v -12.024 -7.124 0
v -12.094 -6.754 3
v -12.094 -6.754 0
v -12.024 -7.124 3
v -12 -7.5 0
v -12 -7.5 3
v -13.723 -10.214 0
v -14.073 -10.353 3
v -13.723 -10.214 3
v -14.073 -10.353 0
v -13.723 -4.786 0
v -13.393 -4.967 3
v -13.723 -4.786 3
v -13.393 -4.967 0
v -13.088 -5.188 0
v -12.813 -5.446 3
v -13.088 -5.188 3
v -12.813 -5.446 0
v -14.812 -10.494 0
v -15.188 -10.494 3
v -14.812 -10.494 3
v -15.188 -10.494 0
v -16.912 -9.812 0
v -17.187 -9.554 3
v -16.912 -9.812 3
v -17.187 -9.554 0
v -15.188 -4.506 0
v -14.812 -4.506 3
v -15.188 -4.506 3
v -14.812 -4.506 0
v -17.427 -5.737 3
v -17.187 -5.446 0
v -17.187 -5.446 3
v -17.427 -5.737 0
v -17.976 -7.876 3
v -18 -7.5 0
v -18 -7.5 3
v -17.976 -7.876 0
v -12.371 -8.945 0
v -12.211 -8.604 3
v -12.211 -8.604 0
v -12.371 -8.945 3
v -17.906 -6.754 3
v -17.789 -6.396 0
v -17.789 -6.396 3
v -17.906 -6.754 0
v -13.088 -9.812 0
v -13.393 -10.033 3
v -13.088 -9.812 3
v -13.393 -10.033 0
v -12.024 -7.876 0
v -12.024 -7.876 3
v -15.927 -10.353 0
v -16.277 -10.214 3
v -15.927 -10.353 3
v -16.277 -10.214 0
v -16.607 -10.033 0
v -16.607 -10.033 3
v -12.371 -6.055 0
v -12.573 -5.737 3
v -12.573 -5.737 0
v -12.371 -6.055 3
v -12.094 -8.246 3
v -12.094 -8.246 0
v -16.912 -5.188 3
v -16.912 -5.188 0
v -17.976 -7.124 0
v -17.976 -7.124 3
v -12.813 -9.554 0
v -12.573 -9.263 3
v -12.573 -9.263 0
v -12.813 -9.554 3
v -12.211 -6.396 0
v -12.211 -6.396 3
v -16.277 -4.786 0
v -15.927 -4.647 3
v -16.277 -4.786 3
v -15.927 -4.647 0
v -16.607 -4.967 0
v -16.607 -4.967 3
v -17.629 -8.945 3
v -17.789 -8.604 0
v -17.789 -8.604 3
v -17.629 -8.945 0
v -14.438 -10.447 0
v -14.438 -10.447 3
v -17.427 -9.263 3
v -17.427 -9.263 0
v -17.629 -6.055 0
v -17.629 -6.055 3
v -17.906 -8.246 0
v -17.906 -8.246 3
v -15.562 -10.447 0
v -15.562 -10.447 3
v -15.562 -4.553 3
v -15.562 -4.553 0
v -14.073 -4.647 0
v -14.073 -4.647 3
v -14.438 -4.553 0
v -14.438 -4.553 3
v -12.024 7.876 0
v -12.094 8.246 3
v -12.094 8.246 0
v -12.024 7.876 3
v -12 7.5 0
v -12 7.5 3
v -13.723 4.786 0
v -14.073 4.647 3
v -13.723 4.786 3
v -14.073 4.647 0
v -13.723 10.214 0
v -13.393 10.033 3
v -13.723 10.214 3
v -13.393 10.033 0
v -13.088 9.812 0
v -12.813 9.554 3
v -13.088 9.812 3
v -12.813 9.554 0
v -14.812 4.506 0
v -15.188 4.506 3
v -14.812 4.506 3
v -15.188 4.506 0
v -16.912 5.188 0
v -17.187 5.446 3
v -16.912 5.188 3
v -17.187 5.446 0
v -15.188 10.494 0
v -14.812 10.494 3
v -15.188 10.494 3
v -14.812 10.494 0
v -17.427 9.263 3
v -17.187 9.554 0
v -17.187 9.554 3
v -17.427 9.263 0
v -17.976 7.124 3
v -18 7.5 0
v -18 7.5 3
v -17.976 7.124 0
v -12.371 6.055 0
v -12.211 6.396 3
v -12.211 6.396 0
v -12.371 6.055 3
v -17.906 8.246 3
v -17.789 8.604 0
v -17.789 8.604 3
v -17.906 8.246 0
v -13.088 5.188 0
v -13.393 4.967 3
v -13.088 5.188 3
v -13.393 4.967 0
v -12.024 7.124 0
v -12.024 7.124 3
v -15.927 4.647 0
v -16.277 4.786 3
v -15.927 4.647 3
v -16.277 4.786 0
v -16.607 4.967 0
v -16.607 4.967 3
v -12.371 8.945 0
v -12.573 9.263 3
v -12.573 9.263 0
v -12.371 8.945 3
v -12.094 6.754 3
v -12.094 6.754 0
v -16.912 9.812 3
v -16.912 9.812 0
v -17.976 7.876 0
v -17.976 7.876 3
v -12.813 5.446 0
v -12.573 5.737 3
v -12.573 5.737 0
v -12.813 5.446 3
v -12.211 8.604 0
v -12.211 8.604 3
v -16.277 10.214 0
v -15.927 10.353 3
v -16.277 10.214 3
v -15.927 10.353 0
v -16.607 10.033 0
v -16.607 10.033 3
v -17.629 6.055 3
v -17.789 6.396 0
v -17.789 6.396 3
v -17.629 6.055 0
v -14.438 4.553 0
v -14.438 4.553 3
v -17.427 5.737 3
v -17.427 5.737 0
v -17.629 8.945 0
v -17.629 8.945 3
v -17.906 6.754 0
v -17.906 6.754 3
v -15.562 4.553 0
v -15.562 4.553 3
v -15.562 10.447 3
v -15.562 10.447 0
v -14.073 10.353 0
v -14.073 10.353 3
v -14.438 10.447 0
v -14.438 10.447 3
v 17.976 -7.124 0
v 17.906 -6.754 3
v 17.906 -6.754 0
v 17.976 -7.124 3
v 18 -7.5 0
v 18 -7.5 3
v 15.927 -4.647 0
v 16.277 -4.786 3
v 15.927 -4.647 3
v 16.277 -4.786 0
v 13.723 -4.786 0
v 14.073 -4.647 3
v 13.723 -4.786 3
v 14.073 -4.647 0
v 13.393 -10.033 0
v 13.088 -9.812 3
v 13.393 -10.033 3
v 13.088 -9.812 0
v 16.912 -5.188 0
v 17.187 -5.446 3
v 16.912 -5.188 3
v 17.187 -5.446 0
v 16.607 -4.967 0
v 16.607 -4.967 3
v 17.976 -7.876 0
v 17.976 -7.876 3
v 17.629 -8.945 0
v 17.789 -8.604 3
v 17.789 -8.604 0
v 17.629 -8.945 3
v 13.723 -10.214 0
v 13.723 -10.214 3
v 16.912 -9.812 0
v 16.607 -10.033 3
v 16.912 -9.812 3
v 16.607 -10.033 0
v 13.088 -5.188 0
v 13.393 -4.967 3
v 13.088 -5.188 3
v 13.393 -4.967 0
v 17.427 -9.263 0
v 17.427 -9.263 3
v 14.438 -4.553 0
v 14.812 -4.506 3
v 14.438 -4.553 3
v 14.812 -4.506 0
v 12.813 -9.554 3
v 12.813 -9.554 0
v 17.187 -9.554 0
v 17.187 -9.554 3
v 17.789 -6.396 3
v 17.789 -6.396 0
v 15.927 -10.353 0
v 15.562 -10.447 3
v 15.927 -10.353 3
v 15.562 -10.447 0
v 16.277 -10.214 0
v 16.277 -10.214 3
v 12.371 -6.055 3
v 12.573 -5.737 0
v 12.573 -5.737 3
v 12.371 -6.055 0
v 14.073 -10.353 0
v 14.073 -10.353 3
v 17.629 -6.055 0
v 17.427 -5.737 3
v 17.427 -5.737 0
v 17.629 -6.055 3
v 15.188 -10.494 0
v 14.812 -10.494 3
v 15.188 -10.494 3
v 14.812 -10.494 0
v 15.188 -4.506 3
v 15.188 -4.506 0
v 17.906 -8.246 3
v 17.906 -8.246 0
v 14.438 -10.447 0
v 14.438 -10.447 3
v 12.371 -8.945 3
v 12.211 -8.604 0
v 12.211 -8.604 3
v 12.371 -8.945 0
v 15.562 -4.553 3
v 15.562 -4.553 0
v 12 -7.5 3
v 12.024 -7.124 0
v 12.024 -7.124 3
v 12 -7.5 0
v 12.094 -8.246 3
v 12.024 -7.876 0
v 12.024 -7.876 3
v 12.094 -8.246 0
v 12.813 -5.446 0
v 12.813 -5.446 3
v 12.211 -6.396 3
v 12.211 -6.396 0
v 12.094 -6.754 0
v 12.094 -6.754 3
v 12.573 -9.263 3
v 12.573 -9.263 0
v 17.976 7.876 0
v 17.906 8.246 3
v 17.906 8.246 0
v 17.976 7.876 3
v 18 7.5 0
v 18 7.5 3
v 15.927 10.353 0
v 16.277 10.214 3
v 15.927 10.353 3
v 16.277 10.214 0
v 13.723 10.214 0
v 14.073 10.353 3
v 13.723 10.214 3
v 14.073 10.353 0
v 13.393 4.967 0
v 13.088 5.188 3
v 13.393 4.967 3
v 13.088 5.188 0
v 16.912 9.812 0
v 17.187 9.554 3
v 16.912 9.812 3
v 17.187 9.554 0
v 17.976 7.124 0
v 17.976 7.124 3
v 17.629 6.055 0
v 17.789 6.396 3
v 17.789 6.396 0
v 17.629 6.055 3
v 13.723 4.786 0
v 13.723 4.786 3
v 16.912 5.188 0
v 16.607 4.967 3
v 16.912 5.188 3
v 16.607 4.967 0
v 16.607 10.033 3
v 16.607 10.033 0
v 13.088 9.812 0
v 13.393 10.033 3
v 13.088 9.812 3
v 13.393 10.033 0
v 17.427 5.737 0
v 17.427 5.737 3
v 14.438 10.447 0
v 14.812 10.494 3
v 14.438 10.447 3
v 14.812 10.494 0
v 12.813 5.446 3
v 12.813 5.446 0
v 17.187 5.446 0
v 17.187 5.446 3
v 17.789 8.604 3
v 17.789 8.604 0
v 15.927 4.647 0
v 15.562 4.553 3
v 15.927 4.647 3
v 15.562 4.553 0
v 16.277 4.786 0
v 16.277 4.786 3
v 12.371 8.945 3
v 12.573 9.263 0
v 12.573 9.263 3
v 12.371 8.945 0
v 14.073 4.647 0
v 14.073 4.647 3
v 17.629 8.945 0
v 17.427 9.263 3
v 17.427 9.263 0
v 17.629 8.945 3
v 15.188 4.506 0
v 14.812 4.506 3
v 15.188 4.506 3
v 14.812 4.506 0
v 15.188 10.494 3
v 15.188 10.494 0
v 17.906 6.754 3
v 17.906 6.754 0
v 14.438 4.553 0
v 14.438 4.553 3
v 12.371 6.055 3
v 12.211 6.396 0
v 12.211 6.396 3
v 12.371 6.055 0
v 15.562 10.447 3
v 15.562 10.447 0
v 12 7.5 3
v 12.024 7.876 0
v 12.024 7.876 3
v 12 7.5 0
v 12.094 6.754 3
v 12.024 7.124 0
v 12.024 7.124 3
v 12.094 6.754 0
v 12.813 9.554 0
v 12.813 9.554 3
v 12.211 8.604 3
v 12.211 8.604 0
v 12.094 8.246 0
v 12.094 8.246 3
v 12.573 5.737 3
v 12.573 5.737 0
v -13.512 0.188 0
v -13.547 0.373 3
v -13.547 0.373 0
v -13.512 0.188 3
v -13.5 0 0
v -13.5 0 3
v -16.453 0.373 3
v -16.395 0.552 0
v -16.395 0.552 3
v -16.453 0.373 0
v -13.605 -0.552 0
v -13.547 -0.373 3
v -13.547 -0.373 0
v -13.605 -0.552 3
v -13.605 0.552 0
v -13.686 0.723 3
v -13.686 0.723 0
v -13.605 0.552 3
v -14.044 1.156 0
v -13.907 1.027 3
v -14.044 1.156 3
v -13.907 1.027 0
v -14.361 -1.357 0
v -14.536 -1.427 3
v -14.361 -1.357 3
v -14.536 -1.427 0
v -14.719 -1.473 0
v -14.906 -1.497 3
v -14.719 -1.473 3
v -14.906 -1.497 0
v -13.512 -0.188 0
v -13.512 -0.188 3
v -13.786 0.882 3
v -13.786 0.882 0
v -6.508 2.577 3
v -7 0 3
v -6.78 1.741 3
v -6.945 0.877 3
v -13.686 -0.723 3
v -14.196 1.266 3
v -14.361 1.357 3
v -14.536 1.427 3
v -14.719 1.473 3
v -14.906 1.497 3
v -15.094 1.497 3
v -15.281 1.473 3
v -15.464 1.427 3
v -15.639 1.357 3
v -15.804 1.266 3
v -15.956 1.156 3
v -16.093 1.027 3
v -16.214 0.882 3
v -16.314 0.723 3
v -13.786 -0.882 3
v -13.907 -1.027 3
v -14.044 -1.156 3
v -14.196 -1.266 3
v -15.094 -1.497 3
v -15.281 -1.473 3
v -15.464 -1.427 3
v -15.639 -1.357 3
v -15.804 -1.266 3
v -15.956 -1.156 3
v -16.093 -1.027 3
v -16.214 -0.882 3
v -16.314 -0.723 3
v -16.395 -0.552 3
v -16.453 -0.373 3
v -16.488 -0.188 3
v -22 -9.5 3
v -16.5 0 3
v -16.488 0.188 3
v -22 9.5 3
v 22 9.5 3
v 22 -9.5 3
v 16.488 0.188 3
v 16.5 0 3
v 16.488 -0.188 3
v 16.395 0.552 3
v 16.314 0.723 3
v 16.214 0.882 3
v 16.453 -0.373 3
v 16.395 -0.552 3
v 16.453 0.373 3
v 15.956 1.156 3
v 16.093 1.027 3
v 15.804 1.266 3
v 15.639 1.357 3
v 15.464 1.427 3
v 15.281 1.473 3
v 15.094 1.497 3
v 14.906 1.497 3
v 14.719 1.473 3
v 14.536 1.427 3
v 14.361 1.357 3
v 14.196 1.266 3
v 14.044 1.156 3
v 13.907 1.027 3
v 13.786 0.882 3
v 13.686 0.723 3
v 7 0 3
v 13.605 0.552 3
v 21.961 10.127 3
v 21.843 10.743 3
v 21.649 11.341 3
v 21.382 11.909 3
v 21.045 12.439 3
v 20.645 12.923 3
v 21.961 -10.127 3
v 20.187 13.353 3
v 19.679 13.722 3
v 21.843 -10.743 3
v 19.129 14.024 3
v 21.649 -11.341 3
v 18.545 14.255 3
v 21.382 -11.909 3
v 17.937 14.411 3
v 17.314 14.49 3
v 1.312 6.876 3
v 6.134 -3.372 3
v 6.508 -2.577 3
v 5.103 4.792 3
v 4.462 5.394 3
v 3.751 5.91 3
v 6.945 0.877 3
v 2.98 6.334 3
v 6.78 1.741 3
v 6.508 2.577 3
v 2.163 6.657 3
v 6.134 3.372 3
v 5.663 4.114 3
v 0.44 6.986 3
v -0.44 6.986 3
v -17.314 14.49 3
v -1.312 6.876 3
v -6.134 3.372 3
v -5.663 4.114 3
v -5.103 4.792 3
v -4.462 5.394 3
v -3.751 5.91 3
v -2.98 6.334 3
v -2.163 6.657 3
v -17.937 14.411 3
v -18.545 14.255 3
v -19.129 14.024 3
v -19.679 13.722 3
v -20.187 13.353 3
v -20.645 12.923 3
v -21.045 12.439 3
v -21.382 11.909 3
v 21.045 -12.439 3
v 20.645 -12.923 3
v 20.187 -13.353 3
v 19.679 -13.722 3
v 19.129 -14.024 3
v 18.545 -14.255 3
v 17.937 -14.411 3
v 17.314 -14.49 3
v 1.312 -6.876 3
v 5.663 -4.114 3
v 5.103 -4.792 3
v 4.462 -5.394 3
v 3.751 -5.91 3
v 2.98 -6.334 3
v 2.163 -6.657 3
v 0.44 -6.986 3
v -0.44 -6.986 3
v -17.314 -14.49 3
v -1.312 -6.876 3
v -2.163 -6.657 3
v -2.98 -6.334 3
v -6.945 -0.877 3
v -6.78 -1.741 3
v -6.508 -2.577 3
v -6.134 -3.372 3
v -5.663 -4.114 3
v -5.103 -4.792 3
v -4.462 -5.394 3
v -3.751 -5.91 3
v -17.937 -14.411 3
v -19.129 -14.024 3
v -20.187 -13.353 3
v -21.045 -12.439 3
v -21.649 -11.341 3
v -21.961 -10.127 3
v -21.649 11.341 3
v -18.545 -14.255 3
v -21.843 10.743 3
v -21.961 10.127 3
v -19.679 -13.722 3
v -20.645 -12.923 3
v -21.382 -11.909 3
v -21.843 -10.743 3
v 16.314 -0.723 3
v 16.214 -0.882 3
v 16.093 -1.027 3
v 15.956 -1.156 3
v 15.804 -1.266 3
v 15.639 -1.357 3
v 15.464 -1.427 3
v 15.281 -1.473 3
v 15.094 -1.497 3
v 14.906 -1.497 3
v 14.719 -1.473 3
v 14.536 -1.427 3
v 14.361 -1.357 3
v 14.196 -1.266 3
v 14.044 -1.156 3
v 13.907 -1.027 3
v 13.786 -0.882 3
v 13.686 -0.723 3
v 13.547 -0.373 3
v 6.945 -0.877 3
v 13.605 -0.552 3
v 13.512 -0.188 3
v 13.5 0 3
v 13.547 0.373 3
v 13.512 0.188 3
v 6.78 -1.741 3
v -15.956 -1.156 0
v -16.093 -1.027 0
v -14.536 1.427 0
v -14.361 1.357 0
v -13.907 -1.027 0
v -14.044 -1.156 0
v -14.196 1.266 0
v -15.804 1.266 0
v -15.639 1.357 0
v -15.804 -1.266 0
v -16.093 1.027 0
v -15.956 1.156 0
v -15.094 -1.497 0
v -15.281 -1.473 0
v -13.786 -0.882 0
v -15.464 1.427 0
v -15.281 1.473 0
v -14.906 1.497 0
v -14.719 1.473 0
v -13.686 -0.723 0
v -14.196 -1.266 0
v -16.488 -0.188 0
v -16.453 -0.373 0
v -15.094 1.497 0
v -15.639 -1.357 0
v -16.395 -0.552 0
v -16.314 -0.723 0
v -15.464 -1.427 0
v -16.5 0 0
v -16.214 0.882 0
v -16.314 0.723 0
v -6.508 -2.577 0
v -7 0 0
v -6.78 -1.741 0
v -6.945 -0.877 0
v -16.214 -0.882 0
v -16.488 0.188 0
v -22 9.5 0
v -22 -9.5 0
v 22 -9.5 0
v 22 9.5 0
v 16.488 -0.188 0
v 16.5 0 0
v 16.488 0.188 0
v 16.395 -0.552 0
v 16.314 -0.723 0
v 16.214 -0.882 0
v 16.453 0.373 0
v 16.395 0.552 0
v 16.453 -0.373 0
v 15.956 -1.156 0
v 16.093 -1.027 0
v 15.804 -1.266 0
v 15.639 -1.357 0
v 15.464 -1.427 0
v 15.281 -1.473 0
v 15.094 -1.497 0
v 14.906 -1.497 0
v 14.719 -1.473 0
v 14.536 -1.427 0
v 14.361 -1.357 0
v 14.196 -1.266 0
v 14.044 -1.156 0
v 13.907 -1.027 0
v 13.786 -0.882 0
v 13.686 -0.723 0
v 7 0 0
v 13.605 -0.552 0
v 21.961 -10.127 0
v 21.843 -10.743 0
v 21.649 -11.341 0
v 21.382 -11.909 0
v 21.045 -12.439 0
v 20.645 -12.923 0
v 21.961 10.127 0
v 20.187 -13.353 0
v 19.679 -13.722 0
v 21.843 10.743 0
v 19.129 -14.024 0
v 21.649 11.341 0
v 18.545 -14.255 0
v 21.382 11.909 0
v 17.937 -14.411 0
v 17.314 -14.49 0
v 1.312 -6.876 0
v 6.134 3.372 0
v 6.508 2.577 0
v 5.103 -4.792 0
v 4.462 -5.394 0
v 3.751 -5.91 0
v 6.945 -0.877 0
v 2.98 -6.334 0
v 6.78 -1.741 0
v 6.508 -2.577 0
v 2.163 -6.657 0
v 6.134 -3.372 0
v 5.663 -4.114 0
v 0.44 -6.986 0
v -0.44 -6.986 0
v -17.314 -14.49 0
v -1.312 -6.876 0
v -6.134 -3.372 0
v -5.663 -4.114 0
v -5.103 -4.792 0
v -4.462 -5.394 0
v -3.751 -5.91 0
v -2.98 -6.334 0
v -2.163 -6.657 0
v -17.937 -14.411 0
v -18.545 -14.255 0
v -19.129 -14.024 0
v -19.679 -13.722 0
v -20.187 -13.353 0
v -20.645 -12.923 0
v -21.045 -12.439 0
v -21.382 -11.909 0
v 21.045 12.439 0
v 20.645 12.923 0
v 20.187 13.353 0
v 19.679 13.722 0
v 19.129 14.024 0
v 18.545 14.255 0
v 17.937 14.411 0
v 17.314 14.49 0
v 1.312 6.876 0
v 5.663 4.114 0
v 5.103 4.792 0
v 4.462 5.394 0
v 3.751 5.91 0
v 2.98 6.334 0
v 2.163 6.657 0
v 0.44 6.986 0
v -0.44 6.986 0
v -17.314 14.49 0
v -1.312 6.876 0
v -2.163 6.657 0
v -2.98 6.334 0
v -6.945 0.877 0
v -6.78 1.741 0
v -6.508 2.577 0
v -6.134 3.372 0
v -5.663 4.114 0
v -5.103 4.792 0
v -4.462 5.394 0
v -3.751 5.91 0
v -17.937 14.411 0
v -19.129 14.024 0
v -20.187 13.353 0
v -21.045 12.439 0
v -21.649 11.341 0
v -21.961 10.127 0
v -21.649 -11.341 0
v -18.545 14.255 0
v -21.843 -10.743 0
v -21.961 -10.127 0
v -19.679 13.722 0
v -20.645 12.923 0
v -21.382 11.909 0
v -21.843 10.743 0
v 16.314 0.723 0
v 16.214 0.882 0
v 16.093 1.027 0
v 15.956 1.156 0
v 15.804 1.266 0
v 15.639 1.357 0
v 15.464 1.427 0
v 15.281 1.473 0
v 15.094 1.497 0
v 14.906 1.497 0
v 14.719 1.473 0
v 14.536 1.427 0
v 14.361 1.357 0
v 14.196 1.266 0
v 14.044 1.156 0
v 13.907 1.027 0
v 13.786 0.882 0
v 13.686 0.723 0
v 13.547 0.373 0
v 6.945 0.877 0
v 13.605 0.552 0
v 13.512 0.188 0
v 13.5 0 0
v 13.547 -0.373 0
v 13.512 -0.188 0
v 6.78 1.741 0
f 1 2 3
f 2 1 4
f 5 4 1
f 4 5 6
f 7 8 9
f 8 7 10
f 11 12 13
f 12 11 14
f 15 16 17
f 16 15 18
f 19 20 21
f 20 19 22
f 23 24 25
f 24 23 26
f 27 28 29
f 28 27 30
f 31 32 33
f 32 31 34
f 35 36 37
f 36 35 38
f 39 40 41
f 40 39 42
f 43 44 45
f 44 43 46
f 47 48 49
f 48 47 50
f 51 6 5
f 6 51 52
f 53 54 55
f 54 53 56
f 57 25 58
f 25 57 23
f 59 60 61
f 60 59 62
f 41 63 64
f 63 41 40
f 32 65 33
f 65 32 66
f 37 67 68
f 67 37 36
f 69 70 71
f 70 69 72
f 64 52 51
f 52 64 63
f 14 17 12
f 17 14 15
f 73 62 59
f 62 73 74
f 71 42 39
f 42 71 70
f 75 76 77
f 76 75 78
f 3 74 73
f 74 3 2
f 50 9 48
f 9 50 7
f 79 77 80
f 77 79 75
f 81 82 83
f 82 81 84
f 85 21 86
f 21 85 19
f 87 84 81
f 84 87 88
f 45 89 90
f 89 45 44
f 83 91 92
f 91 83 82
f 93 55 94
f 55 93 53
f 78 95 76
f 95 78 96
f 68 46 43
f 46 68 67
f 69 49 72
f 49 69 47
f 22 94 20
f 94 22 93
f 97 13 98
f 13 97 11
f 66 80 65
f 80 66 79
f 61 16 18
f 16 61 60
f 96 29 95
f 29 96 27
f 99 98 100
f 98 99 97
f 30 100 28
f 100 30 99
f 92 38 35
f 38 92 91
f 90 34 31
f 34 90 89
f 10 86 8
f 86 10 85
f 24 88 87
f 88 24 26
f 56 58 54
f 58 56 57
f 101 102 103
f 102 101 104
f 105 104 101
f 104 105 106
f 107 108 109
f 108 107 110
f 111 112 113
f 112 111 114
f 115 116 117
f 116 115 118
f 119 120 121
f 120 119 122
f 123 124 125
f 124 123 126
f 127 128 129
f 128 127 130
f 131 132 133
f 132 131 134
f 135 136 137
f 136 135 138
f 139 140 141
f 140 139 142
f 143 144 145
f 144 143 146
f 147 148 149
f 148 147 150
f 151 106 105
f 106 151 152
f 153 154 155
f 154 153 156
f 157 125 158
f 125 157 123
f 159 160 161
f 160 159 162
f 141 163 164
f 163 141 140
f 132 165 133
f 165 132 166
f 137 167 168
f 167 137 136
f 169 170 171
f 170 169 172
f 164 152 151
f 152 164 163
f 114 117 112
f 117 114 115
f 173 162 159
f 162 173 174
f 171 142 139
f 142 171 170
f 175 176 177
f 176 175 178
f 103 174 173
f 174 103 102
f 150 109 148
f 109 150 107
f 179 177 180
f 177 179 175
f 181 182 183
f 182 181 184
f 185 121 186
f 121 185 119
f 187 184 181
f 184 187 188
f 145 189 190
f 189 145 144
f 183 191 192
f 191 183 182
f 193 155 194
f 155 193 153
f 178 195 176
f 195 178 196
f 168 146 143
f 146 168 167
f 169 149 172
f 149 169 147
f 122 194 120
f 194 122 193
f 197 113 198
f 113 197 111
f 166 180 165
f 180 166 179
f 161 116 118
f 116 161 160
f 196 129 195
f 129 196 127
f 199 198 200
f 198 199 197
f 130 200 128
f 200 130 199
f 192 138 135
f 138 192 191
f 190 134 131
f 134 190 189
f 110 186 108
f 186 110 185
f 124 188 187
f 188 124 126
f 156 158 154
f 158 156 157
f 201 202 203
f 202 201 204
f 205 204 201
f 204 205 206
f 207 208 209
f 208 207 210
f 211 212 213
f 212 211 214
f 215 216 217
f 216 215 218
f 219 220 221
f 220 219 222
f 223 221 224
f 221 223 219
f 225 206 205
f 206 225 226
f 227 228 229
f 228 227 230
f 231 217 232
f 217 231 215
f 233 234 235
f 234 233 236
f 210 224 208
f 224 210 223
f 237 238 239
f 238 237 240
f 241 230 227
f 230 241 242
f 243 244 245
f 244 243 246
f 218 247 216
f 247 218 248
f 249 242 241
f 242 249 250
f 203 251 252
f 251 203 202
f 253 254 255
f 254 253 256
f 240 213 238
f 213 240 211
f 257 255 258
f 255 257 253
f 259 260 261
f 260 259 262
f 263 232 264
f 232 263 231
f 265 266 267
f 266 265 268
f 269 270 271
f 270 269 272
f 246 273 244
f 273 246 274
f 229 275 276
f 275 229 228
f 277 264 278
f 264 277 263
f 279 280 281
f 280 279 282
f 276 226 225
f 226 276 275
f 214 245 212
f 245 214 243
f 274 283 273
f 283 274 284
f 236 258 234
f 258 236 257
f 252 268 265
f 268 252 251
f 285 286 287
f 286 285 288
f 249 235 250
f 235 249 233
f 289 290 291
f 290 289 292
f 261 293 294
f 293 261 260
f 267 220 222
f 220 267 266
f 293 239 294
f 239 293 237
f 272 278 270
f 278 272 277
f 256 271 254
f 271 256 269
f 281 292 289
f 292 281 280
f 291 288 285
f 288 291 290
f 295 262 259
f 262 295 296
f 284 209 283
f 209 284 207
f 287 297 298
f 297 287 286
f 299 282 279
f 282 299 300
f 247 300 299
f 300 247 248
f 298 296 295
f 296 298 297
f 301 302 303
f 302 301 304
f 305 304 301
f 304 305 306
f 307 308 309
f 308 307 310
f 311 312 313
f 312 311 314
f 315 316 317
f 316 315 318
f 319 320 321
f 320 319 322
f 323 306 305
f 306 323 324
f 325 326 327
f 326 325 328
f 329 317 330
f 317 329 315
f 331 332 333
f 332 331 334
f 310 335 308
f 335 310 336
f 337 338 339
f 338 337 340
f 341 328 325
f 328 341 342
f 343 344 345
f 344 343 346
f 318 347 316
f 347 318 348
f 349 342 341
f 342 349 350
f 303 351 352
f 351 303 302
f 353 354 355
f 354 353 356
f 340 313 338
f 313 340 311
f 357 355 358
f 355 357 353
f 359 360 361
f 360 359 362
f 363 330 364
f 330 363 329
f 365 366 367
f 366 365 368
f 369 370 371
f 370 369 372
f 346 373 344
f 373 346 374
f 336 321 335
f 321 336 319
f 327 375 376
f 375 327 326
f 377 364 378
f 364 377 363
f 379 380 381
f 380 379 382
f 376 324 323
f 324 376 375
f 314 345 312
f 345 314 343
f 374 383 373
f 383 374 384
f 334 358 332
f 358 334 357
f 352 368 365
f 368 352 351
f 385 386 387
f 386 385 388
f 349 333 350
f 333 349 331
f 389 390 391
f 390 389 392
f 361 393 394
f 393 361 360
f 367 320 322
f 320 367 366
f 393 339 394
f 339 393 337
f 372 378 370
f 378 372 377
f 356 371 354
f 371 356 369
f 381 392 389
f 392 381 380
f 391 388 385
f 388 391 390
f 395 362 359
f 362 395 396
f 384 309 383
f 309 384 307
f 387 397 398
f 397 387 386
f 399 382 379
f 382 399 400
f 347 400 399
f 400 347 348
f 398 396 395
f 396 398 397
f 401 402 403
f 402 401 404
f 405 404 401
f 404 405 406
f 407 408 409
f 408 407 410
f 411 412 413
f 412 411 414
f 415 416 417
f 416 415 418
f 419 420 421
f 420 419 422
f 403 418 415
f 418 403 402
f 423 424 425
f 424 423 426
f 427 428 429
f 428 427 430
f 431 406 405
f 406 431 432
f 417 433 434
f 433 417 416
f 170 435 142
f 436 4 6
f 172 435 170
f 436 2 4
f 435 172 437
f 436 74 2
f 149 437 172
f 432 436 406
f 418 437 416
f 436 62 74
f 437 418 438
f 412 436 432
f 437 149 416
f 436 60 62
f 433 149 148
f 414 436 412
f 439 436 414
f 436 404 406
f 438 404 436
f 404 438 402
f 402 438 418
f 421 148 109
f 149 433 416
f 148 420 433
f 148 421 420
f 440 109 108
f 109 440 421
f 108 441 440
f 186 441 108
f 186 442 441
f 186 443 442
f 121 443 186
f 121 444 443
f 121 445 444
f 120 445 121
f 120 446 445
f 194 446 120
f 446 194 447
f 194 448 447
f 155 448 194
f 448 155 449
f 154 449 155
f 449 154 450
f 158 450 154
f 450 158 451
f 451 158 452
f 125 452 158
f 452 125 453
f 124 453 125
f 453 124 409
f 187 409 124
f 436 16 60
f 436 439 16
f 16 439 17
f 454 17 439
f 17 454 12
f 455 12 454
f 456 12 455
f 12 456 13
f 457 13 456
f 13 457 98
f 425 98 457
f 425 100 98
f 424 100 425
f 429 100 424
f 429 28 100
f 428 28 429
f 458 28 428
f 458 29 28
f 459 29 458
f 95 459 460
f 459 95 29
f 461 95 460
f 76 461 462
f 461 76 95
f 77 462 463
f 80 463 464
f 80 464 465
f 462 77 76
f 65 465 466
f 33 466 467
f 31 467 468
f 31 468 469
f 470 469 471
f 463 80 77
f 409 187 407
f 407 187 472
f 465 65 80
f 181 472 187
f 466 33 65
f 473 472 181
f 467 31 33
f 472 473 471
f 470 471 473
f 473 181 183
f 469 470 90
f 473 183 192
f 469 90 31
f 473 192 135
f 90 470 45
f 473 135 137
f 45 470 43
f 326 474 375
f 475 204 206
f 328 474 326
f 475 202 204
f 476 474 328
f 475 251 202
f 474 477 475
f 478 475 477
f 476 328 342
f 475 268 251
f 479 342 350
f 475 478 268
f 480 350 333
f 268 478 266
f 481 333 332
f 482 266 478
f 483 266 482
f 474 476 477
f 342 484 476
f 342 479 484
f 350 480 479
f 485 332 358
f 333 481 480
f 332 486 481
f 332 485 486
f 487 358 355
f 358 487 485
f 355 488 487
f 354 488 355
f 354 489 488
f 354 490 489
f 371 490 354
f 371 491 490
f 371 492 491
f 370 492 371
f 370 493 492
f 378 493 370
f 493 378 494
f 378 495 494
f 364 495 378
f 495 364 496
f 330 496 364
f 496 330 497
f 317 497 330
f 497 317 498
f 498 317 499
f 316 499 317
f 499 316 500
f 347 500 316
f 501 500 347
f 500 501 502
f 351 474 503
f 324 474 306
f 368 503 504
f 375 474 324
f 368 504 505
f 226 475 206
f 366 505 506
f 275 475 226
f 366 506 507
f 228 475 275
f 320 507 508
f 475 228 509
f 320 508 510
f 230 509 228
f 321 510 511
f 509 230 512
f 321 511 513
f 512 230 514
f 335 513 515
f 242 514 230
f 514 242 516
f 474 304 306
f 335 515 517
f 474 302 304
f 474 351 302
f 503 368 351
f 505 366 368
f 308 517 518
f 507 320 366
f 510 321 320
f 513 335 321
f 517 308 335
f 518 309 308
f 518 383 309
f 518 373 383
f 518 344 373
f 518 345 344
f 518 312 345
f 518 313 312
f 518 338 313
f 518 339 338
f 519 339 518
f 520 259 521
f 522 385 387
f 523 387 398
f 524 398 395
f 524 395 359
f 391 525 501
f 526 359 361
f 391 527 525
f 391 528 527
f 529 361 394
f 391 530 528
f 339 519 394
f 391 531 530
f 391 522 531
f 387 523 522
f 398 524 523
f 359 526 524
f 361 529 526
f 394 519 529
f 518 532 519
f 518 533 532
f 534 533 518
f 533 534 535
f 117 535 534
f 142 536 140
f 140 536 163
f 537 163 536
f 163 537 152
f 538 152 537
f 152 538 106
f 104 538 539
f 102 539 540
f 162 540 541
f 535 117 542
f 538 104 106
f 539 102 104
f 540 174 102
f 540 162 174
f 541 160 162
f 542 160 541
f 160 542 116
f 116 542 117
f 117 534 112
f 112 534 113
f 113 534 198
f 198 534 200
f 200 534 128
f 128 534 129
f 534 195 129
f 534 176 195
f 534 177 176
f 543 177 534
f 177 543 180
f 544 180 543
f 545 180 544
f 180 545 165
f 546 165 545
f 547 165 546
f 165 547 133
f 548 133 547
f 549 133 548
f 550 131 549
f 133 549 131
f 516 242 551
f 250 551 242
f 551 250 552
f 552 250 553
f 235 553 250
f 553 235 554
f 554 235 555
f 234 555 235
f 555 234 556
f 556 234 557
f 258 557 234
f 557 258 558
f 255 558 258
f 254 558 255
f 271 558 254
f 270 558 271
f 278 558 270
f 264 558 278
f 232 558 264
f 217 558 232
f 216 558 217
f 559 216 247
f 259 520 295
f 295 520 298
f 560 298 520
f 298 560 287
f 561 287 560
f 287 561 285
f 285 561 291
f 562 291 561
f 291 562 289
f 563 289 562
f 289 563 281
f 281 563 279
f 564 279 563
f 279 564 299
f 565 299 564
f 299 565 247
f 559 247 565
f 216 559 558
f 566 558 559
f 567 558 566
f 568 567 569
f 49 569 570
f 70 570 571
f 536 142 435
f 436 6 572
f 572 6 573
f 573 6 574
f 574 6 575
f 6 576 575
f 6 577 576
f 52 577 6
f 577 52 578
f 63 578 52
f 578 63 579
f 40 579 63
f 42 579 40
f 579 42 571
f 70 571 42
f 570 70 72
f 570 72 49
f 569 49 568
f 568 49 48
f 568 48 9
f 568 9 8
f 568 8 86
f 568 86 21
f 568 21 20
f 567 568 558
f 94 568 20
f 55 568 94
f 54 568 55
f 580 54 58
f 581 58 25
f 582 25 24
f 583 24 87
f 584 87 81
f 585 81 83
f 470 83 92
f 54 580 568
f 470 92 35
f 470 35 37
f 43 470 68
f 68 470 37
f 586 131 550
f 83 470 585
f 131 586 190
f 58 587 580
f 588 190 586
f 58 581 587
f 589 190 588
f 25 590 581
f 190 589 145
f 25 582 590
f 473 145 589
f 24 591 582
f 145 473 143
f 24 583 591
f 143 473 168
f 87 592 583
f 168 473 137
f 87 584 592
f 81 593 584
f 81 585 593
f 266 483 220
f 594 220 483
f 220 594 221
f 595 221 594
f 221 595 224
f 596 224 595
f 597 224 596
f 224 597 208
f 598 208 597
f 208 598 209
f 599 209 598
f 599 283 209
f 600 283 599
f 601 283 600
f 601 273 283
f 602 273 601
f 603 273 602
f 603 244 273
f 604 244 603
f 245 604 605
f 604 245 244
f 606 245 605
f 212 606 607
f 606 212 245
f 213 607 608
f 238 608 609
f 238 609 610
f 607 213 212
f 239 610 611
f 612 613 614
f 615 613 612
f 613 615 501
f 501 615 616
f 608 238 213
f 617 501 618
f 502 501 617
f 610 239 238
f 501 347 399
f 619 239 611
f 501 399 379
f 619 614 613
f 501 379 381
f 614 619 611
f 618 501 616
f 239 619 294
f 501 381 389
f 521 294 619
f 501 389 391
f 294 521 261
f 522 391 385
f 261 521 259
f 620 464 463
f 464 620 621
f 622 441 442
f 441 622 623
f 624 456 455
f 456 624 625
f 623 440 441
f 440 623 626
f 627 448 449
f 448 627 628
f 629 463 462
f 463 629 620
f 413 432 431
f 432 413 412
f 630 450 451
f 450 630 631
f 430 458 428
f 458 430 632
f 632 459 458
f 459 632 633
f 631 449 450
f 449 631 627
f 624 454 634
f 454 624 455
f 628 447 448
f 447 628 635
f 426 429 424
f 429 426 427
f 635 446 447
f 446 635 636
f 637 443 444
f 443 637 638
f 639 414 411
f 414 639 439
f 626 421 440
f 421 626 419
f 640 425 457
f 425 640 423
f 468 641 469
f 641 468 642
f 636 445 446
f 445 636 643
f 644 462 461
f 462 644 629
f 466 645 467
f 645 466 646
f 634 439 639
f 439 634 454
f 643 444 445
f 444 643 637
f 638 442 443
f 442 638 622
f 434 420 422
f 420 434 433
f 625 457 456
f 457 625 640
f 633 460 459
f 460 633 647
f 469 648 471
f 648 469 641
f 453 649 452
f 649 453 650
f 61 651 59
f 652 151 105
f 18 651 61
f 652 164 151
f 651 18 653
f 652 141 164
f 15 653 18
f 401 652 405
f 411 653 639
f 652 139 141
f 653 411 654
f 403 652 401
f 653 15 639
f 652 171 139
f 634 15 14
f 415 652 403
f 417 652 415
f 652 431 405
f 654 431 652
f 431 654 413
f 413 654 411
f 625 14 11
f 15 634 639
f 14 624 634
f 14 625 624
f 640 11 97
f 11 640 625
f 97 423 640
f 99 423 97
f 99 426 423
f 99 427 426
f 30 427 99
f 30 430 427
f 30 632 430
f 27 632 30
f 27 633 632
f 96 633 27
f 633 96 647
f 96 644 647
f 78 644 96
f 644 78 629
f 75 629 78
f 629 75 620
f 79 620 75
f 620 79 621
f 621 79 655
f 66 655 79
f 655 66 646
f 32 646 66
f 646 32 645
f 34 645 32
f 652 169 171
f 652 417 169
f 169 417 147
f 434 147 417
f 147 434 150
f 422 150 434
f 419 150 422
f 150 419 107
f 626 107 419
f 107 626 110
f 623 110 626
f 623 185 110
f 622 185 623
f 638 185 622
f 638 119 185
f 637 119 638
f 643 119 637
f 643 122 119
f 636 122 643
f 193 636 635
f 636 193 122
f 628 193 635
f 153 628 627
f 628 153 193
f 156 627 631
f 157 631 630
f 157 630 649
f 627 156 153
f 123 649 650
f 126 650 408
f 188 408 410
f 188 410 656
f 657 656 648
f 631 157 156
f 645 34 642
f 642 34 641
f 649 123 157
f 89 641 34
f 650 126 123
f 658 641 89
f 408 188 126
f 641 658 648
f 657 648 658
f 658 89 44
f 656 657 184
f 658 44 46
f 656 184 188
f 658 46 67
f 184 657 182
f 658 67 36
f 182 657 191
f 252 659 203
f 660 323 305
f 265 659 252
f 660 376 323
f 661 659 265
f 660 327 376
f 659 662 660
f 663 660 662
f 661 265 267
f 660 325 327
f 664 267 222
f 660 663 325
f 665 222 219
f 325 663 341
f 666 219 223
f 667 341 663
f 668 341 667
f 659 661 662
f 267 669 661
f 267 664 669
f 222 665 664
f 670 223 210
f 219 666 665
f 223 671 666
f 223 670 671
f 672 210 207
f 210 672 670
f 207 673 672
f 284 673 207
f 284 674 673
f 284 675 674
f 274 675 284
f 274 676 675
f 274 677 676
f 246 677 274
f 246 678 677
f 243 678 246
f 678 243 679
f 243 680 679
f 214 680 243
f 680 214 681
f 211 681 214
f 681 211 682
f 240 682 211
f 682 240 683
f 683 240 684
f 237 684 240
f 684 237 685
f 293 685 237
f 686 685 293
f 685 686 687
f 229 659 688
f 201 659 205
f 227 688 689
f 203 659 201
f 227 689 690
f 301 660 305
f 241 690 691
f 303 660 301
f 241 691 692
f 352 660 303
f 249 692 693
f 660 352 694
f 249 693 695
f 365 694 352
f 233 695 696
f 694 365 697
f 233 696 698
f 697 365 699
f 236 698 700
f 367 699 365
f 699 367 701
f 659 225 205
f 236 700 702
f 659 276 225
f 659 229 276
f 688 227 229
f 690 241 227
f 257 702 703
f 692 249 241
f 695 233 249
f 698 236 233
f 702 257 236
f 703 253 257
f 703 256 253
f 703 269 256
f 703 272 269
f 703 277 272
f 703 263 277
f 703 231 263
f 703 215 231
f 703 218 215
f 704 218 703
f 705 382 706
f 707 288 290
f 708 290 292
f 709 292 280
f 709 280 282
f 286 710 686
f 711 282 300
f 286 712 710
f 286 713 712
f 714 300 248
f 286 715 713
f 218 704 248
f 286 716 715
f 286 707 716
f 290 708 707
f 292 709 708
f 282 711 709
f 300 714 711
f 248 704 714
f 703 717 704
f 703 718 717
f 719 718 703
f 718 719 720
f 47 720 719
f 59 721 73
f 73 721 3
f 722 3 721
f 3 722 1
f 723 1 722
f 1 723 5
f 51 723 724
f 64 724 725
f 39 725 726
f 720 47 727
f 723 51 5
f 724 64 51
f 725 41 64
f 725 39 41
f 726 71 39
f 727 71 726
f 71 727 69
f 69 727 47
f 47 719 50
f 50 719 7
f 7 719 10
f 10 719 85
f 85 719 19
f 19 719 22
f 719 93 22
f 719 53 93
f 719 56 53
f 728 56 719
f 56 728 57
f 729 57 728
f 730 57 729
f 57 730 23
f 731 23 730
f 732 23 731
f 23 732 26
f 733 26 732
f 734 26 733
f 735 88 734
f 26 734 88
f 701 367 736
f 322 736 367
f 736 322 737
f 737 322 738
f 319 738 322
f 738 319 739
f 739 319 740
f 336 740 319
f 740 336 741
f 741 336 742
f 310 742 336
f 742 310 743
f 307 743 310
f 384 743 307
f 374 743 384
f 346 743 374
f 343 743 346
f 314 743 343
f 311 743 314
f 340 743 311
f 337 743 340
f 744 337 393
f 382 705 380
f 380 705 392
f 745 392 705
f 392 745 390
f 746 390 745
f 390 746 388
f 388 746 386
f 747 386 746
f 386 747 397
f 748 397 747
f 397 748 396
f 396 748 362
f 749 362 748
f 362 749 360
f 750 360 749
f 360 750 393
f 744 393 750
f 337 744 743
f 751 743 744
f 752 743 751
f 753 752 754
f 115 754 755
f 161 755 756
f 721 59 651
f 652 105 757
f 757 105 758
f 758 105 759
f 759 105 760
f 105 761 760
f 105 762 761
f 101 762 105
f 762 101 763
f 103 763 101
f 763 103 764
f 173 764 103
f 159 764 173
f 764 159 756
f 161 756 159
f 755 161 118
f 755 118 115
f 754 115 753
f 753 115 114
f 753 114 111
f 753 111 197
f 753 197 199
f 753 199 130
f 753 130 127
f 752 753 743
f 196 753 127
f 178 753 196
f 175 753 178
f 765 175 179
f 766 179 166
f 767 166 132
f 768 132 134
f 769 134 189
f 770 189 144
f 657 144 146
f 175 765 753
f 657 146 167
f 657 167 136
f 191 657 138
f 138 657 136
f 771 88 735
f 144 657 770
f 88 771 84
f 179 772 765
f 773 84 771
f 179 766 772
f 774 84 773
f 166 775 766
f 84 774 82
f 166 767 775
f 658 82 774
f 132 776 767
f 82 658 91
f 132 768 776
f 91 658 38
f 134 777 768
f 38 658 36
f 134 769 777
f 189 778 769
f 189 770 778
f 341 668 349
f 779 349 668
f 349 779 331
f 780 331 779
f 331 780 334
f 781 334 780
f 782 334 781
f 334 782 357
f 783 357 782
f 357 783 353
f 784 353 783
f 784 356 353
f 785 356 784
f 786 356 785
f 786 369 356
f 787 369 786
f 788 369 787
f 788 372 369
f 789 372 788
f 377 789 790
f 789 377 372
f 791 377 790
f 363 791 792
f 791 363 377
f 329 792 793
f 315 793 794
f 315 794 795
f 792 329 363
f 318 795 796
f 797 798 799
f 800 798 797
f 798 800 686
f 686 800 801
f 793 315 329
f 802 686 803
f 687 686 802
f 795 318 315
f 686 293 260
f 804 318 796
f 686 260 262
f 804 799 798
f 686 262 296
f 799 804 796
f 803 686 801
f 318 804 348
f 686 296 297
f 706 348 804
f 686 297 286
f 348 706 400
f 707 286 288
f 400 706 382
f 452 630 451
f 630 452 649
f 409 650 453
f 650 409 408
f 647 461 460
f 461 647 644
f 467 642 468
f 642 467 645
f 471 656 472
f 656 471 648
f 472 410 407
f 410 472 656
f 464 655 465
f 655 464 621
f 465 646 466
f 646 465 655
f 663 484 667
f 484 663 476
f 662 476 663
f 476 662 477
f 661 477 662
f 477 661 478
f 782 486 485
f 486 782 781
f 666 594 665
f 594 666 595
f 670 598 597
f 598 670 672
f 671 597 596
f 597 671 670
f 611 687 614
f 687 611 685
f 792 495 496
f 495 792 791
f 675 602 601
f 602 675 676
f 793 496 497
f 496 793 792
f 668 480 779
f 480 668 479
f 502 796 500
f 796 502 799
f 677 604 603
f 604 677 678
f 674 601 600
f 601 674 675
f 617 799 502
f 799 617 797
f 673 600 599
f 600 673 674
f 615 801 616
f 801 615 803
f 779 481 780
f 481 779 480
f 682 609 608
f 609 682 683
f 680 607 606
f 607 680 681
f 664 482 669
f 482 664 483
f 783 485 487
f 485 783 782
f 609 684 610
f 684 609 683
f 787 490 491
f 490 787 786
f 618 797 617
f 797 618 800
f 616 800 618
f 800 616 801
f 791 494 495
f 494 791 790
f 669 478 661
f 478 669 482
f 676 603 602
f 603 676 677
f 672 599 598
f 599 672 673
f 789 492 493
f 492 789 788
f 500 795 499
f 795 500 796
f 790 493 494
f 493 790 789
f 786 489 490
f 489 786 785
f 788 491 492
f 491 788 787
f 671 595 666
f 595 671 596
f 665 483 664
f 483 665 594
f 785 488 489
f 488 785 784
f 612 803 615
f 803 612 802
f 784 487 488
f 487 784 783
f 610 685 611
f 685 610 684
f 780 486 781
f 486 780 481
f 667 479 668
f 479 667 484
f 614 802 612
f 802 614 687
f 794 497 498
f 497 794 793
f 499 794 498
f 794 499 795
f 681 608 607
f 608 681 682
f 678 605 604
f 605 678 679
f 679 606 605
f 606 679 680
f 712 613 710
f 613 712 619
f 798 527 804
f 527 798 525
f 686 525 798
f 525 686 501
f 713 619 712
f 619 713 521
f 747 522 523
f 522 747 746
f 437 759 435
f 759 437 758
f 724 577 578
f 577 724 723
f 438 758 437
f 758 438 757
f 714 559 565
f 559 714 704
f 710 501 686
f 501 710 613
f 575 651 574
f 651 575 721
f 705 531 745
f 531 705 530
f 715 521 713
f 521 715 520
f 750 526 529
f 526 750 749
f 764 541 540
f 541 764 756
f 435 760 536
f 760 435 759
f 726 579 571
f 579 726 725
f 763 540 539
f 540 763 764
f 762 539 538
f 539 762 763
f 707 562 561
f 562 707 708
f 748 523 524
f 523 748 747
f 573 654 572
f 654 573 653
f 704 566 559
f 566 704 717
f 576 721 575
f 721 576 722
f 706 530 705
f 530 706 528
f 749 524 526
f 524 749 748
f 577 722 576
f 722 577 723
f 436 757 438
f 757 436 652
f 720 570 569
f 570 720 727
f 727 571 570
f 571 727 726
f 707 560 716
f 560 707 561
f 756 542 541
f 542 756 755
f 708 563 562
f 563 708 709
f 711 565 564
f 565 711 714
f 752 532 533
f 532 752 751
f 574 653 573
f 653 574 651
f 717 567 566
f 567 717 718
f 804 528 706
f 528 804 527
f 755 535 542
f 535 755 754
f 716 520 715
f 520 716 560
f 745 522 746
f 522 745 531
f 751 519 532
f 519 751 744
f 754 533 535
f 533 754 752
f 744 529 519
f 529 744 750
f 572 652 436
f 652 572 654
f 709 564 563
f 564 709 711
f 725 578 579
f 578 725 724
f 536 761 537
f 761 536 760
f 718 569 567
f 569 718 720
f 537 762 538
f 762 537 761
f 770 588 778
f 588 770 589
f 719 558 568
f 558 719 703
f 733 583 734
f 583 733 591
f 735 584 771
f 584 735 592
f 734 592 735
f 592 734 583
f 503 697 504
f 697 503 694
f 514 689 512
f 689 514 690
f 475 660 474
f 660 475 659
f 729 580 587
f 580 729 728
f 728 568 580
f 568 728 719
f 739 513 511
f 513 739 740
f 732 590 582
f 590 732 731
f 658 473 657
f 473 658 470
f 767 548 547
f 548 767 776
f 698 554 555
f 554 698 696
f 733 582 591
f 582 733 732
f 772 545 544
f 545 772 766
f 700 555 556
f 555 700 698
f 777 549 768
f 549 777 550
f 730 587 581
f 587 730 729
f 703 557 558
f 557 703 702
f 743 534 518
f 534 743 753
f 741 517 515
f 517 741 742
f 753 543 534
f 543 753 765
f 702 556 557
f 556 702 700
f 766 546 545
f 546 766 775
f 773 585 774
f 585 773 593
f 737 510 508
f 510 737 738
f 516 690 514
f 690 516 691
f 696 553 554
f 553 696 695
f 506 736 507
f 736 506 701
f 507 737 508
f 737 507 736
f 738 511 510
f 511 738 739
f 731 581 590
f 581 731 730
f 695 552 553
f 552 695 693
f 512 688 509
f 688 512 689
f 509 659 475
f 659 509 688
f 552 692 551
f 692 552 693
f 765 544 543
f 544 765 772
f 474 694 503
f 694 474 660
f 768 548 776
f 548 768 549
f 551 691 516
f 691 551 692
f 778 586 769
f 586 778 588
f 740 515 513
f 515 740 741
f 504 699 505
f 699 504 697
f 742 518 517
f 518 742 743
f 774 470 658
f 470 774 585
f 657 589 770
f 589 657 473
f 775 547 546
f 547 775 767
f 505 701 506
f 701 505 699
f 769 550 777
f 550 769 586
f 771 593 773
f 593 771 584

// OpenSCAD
$fn = 50;


difference() {
	union() {
		hull() {
			translate(v = [-17.0000000000, 9.5000000000, 0]) {
				cylinder(h = 3, r = 5);
			}
			translate(v = [17.0000000000, 9.5000000000, 0]) {
				cylinder(h = 3, r = 5);
			}
			translate(v = [-17.0000000000, -9.5000000000, 0]) {
				cylinder(h = 3, r = 5);
			}
			translate(v = [17.0000000000, -9.5000000000, 0]) {
				cylinder(h = 3, r = 5);
			}
		}
	}
	union() {
		#translate(v = [-15.0000000000, -7.5000000000, 0]) {
			cylinder(h = 3, r = 3.0000000000);
		}
		#translate(v = [-15.0000000000, 7.5000000000, 0]) {
			cylinder(h = 3, r = 3.0000000000);
		}
		#translate(v = [15.0000000000, -7.5000000000, 0]) {
			cylinder(h = 3, r = 3.0000000000);
		}
		#translate(v = [15.0000000000, 7.5000000000, 0]) {
			cylinder(h = 3, r = 3.0000000000);
		}
		#translate(v = [-15.0000000000, -7.5000000000, -100.0000000000]) {
			cylinder(h = 200, r = 3.0000000000);
		}
		#translate(v = [-15.0000000000, 7.5000000000, -100.0000000000]) {
			cylinder(h = 200, r = 3.0000000000);
		}
		#translate(v = [15.0000000000, -7.5000000000, -100.0000000000]) {
			cylinder(h = 200, r = 3.0000000000);
		}
		#translate(v = [15.0000000000, 7.5000000000, -100.0000000000]) {
			cylinder(h = 200, r = 3.0000000000);
		}
		#translate(v = [-15.0000000000, -7.5000000000, 0]) {
			cylinder(h = 3, r = 1.5000000000);
		}
		#translate(v = [-15.0000000000, 0.0000000000, 0]) {
			cylinder(h = 3, r = 1.5000000000);
		}
		#translate(v = [-15.0000000000, 7.5000000000, 0]) {
			cylinder(h = 3, r = 1.5000000000);
		}
		#translate(v = [15.0000000000, -7.5000000000, 0]) {
			cylinder(h = 3, r = 1.5000000000);
		}
		#translate(v = [15.0000000000, 0.0000000000, 0]) {
			cylinder(h = 3, r = 1.5000000000);
		}
		#translate(v = [15.0000000000, 7.5000000000, 0]) {
			cylinder(h = 3, r = 1.5000000000);
		}
		#translate(v = [-15.0000000000, -7.5000000000, 0]) {
			cylinder(h = 3, r = 1.5000000000);
		}
		#translate(v = [-15.0000000000, 0.0000000000, 0]) {
			cylinder(h = 3, r = 1.5000000000);
		}
		#translate(v = [-15.0000000000, 7.5000000000, 0]) {
			cylinder(h = 3, r = 1.5000000000);
		}
		#translate(v = [15.0000000000, -7.5000000000, 0]) {
			cylinder(h = 3, r = 1.5000000000);
		}
		#translate(v = [15.0000000000, 0.0000000000, 0]) {
			cylinder(h = 3, r = 1.5000000000);
		}
		#translate(v = [15.0000000000, 7.5000000000, 0]) {
			cylinder(h = 3, r = 1.5000000000);
		}
		#translate(v = [-15.0000000000, -7.5000000000, 0]) {
			cylinder(h = 3, r = 1.5000000000);
		}
		#translate(v = [-15.0000000000, 0.0000000000, 0]) {
			cylinder(h = 3, r = 1.5000000000);
		}
		#translate(v = [-15.0000000000, 7.5000000000, 0]) {
			cylinder(h = 3, r = 1.5000000000);
		}
		#translate(v = [15.0000000000, -7.5000000000, 0]) {
			cylinder(h = 3, r = 1.5000000000);
		}
		#translate(v = [15.0000000000, 0.0000000000, 0]) {
			cylinder(h = 3, r = 1.5000000000);
		}
		#translate(v = [15.0000000000, 7.5000000000, 0]) {
			cylinder(h = 3, r = 1.5000000000);
		}
		#cylinder(h = 3, r = 7.0000000000);
	}
}
